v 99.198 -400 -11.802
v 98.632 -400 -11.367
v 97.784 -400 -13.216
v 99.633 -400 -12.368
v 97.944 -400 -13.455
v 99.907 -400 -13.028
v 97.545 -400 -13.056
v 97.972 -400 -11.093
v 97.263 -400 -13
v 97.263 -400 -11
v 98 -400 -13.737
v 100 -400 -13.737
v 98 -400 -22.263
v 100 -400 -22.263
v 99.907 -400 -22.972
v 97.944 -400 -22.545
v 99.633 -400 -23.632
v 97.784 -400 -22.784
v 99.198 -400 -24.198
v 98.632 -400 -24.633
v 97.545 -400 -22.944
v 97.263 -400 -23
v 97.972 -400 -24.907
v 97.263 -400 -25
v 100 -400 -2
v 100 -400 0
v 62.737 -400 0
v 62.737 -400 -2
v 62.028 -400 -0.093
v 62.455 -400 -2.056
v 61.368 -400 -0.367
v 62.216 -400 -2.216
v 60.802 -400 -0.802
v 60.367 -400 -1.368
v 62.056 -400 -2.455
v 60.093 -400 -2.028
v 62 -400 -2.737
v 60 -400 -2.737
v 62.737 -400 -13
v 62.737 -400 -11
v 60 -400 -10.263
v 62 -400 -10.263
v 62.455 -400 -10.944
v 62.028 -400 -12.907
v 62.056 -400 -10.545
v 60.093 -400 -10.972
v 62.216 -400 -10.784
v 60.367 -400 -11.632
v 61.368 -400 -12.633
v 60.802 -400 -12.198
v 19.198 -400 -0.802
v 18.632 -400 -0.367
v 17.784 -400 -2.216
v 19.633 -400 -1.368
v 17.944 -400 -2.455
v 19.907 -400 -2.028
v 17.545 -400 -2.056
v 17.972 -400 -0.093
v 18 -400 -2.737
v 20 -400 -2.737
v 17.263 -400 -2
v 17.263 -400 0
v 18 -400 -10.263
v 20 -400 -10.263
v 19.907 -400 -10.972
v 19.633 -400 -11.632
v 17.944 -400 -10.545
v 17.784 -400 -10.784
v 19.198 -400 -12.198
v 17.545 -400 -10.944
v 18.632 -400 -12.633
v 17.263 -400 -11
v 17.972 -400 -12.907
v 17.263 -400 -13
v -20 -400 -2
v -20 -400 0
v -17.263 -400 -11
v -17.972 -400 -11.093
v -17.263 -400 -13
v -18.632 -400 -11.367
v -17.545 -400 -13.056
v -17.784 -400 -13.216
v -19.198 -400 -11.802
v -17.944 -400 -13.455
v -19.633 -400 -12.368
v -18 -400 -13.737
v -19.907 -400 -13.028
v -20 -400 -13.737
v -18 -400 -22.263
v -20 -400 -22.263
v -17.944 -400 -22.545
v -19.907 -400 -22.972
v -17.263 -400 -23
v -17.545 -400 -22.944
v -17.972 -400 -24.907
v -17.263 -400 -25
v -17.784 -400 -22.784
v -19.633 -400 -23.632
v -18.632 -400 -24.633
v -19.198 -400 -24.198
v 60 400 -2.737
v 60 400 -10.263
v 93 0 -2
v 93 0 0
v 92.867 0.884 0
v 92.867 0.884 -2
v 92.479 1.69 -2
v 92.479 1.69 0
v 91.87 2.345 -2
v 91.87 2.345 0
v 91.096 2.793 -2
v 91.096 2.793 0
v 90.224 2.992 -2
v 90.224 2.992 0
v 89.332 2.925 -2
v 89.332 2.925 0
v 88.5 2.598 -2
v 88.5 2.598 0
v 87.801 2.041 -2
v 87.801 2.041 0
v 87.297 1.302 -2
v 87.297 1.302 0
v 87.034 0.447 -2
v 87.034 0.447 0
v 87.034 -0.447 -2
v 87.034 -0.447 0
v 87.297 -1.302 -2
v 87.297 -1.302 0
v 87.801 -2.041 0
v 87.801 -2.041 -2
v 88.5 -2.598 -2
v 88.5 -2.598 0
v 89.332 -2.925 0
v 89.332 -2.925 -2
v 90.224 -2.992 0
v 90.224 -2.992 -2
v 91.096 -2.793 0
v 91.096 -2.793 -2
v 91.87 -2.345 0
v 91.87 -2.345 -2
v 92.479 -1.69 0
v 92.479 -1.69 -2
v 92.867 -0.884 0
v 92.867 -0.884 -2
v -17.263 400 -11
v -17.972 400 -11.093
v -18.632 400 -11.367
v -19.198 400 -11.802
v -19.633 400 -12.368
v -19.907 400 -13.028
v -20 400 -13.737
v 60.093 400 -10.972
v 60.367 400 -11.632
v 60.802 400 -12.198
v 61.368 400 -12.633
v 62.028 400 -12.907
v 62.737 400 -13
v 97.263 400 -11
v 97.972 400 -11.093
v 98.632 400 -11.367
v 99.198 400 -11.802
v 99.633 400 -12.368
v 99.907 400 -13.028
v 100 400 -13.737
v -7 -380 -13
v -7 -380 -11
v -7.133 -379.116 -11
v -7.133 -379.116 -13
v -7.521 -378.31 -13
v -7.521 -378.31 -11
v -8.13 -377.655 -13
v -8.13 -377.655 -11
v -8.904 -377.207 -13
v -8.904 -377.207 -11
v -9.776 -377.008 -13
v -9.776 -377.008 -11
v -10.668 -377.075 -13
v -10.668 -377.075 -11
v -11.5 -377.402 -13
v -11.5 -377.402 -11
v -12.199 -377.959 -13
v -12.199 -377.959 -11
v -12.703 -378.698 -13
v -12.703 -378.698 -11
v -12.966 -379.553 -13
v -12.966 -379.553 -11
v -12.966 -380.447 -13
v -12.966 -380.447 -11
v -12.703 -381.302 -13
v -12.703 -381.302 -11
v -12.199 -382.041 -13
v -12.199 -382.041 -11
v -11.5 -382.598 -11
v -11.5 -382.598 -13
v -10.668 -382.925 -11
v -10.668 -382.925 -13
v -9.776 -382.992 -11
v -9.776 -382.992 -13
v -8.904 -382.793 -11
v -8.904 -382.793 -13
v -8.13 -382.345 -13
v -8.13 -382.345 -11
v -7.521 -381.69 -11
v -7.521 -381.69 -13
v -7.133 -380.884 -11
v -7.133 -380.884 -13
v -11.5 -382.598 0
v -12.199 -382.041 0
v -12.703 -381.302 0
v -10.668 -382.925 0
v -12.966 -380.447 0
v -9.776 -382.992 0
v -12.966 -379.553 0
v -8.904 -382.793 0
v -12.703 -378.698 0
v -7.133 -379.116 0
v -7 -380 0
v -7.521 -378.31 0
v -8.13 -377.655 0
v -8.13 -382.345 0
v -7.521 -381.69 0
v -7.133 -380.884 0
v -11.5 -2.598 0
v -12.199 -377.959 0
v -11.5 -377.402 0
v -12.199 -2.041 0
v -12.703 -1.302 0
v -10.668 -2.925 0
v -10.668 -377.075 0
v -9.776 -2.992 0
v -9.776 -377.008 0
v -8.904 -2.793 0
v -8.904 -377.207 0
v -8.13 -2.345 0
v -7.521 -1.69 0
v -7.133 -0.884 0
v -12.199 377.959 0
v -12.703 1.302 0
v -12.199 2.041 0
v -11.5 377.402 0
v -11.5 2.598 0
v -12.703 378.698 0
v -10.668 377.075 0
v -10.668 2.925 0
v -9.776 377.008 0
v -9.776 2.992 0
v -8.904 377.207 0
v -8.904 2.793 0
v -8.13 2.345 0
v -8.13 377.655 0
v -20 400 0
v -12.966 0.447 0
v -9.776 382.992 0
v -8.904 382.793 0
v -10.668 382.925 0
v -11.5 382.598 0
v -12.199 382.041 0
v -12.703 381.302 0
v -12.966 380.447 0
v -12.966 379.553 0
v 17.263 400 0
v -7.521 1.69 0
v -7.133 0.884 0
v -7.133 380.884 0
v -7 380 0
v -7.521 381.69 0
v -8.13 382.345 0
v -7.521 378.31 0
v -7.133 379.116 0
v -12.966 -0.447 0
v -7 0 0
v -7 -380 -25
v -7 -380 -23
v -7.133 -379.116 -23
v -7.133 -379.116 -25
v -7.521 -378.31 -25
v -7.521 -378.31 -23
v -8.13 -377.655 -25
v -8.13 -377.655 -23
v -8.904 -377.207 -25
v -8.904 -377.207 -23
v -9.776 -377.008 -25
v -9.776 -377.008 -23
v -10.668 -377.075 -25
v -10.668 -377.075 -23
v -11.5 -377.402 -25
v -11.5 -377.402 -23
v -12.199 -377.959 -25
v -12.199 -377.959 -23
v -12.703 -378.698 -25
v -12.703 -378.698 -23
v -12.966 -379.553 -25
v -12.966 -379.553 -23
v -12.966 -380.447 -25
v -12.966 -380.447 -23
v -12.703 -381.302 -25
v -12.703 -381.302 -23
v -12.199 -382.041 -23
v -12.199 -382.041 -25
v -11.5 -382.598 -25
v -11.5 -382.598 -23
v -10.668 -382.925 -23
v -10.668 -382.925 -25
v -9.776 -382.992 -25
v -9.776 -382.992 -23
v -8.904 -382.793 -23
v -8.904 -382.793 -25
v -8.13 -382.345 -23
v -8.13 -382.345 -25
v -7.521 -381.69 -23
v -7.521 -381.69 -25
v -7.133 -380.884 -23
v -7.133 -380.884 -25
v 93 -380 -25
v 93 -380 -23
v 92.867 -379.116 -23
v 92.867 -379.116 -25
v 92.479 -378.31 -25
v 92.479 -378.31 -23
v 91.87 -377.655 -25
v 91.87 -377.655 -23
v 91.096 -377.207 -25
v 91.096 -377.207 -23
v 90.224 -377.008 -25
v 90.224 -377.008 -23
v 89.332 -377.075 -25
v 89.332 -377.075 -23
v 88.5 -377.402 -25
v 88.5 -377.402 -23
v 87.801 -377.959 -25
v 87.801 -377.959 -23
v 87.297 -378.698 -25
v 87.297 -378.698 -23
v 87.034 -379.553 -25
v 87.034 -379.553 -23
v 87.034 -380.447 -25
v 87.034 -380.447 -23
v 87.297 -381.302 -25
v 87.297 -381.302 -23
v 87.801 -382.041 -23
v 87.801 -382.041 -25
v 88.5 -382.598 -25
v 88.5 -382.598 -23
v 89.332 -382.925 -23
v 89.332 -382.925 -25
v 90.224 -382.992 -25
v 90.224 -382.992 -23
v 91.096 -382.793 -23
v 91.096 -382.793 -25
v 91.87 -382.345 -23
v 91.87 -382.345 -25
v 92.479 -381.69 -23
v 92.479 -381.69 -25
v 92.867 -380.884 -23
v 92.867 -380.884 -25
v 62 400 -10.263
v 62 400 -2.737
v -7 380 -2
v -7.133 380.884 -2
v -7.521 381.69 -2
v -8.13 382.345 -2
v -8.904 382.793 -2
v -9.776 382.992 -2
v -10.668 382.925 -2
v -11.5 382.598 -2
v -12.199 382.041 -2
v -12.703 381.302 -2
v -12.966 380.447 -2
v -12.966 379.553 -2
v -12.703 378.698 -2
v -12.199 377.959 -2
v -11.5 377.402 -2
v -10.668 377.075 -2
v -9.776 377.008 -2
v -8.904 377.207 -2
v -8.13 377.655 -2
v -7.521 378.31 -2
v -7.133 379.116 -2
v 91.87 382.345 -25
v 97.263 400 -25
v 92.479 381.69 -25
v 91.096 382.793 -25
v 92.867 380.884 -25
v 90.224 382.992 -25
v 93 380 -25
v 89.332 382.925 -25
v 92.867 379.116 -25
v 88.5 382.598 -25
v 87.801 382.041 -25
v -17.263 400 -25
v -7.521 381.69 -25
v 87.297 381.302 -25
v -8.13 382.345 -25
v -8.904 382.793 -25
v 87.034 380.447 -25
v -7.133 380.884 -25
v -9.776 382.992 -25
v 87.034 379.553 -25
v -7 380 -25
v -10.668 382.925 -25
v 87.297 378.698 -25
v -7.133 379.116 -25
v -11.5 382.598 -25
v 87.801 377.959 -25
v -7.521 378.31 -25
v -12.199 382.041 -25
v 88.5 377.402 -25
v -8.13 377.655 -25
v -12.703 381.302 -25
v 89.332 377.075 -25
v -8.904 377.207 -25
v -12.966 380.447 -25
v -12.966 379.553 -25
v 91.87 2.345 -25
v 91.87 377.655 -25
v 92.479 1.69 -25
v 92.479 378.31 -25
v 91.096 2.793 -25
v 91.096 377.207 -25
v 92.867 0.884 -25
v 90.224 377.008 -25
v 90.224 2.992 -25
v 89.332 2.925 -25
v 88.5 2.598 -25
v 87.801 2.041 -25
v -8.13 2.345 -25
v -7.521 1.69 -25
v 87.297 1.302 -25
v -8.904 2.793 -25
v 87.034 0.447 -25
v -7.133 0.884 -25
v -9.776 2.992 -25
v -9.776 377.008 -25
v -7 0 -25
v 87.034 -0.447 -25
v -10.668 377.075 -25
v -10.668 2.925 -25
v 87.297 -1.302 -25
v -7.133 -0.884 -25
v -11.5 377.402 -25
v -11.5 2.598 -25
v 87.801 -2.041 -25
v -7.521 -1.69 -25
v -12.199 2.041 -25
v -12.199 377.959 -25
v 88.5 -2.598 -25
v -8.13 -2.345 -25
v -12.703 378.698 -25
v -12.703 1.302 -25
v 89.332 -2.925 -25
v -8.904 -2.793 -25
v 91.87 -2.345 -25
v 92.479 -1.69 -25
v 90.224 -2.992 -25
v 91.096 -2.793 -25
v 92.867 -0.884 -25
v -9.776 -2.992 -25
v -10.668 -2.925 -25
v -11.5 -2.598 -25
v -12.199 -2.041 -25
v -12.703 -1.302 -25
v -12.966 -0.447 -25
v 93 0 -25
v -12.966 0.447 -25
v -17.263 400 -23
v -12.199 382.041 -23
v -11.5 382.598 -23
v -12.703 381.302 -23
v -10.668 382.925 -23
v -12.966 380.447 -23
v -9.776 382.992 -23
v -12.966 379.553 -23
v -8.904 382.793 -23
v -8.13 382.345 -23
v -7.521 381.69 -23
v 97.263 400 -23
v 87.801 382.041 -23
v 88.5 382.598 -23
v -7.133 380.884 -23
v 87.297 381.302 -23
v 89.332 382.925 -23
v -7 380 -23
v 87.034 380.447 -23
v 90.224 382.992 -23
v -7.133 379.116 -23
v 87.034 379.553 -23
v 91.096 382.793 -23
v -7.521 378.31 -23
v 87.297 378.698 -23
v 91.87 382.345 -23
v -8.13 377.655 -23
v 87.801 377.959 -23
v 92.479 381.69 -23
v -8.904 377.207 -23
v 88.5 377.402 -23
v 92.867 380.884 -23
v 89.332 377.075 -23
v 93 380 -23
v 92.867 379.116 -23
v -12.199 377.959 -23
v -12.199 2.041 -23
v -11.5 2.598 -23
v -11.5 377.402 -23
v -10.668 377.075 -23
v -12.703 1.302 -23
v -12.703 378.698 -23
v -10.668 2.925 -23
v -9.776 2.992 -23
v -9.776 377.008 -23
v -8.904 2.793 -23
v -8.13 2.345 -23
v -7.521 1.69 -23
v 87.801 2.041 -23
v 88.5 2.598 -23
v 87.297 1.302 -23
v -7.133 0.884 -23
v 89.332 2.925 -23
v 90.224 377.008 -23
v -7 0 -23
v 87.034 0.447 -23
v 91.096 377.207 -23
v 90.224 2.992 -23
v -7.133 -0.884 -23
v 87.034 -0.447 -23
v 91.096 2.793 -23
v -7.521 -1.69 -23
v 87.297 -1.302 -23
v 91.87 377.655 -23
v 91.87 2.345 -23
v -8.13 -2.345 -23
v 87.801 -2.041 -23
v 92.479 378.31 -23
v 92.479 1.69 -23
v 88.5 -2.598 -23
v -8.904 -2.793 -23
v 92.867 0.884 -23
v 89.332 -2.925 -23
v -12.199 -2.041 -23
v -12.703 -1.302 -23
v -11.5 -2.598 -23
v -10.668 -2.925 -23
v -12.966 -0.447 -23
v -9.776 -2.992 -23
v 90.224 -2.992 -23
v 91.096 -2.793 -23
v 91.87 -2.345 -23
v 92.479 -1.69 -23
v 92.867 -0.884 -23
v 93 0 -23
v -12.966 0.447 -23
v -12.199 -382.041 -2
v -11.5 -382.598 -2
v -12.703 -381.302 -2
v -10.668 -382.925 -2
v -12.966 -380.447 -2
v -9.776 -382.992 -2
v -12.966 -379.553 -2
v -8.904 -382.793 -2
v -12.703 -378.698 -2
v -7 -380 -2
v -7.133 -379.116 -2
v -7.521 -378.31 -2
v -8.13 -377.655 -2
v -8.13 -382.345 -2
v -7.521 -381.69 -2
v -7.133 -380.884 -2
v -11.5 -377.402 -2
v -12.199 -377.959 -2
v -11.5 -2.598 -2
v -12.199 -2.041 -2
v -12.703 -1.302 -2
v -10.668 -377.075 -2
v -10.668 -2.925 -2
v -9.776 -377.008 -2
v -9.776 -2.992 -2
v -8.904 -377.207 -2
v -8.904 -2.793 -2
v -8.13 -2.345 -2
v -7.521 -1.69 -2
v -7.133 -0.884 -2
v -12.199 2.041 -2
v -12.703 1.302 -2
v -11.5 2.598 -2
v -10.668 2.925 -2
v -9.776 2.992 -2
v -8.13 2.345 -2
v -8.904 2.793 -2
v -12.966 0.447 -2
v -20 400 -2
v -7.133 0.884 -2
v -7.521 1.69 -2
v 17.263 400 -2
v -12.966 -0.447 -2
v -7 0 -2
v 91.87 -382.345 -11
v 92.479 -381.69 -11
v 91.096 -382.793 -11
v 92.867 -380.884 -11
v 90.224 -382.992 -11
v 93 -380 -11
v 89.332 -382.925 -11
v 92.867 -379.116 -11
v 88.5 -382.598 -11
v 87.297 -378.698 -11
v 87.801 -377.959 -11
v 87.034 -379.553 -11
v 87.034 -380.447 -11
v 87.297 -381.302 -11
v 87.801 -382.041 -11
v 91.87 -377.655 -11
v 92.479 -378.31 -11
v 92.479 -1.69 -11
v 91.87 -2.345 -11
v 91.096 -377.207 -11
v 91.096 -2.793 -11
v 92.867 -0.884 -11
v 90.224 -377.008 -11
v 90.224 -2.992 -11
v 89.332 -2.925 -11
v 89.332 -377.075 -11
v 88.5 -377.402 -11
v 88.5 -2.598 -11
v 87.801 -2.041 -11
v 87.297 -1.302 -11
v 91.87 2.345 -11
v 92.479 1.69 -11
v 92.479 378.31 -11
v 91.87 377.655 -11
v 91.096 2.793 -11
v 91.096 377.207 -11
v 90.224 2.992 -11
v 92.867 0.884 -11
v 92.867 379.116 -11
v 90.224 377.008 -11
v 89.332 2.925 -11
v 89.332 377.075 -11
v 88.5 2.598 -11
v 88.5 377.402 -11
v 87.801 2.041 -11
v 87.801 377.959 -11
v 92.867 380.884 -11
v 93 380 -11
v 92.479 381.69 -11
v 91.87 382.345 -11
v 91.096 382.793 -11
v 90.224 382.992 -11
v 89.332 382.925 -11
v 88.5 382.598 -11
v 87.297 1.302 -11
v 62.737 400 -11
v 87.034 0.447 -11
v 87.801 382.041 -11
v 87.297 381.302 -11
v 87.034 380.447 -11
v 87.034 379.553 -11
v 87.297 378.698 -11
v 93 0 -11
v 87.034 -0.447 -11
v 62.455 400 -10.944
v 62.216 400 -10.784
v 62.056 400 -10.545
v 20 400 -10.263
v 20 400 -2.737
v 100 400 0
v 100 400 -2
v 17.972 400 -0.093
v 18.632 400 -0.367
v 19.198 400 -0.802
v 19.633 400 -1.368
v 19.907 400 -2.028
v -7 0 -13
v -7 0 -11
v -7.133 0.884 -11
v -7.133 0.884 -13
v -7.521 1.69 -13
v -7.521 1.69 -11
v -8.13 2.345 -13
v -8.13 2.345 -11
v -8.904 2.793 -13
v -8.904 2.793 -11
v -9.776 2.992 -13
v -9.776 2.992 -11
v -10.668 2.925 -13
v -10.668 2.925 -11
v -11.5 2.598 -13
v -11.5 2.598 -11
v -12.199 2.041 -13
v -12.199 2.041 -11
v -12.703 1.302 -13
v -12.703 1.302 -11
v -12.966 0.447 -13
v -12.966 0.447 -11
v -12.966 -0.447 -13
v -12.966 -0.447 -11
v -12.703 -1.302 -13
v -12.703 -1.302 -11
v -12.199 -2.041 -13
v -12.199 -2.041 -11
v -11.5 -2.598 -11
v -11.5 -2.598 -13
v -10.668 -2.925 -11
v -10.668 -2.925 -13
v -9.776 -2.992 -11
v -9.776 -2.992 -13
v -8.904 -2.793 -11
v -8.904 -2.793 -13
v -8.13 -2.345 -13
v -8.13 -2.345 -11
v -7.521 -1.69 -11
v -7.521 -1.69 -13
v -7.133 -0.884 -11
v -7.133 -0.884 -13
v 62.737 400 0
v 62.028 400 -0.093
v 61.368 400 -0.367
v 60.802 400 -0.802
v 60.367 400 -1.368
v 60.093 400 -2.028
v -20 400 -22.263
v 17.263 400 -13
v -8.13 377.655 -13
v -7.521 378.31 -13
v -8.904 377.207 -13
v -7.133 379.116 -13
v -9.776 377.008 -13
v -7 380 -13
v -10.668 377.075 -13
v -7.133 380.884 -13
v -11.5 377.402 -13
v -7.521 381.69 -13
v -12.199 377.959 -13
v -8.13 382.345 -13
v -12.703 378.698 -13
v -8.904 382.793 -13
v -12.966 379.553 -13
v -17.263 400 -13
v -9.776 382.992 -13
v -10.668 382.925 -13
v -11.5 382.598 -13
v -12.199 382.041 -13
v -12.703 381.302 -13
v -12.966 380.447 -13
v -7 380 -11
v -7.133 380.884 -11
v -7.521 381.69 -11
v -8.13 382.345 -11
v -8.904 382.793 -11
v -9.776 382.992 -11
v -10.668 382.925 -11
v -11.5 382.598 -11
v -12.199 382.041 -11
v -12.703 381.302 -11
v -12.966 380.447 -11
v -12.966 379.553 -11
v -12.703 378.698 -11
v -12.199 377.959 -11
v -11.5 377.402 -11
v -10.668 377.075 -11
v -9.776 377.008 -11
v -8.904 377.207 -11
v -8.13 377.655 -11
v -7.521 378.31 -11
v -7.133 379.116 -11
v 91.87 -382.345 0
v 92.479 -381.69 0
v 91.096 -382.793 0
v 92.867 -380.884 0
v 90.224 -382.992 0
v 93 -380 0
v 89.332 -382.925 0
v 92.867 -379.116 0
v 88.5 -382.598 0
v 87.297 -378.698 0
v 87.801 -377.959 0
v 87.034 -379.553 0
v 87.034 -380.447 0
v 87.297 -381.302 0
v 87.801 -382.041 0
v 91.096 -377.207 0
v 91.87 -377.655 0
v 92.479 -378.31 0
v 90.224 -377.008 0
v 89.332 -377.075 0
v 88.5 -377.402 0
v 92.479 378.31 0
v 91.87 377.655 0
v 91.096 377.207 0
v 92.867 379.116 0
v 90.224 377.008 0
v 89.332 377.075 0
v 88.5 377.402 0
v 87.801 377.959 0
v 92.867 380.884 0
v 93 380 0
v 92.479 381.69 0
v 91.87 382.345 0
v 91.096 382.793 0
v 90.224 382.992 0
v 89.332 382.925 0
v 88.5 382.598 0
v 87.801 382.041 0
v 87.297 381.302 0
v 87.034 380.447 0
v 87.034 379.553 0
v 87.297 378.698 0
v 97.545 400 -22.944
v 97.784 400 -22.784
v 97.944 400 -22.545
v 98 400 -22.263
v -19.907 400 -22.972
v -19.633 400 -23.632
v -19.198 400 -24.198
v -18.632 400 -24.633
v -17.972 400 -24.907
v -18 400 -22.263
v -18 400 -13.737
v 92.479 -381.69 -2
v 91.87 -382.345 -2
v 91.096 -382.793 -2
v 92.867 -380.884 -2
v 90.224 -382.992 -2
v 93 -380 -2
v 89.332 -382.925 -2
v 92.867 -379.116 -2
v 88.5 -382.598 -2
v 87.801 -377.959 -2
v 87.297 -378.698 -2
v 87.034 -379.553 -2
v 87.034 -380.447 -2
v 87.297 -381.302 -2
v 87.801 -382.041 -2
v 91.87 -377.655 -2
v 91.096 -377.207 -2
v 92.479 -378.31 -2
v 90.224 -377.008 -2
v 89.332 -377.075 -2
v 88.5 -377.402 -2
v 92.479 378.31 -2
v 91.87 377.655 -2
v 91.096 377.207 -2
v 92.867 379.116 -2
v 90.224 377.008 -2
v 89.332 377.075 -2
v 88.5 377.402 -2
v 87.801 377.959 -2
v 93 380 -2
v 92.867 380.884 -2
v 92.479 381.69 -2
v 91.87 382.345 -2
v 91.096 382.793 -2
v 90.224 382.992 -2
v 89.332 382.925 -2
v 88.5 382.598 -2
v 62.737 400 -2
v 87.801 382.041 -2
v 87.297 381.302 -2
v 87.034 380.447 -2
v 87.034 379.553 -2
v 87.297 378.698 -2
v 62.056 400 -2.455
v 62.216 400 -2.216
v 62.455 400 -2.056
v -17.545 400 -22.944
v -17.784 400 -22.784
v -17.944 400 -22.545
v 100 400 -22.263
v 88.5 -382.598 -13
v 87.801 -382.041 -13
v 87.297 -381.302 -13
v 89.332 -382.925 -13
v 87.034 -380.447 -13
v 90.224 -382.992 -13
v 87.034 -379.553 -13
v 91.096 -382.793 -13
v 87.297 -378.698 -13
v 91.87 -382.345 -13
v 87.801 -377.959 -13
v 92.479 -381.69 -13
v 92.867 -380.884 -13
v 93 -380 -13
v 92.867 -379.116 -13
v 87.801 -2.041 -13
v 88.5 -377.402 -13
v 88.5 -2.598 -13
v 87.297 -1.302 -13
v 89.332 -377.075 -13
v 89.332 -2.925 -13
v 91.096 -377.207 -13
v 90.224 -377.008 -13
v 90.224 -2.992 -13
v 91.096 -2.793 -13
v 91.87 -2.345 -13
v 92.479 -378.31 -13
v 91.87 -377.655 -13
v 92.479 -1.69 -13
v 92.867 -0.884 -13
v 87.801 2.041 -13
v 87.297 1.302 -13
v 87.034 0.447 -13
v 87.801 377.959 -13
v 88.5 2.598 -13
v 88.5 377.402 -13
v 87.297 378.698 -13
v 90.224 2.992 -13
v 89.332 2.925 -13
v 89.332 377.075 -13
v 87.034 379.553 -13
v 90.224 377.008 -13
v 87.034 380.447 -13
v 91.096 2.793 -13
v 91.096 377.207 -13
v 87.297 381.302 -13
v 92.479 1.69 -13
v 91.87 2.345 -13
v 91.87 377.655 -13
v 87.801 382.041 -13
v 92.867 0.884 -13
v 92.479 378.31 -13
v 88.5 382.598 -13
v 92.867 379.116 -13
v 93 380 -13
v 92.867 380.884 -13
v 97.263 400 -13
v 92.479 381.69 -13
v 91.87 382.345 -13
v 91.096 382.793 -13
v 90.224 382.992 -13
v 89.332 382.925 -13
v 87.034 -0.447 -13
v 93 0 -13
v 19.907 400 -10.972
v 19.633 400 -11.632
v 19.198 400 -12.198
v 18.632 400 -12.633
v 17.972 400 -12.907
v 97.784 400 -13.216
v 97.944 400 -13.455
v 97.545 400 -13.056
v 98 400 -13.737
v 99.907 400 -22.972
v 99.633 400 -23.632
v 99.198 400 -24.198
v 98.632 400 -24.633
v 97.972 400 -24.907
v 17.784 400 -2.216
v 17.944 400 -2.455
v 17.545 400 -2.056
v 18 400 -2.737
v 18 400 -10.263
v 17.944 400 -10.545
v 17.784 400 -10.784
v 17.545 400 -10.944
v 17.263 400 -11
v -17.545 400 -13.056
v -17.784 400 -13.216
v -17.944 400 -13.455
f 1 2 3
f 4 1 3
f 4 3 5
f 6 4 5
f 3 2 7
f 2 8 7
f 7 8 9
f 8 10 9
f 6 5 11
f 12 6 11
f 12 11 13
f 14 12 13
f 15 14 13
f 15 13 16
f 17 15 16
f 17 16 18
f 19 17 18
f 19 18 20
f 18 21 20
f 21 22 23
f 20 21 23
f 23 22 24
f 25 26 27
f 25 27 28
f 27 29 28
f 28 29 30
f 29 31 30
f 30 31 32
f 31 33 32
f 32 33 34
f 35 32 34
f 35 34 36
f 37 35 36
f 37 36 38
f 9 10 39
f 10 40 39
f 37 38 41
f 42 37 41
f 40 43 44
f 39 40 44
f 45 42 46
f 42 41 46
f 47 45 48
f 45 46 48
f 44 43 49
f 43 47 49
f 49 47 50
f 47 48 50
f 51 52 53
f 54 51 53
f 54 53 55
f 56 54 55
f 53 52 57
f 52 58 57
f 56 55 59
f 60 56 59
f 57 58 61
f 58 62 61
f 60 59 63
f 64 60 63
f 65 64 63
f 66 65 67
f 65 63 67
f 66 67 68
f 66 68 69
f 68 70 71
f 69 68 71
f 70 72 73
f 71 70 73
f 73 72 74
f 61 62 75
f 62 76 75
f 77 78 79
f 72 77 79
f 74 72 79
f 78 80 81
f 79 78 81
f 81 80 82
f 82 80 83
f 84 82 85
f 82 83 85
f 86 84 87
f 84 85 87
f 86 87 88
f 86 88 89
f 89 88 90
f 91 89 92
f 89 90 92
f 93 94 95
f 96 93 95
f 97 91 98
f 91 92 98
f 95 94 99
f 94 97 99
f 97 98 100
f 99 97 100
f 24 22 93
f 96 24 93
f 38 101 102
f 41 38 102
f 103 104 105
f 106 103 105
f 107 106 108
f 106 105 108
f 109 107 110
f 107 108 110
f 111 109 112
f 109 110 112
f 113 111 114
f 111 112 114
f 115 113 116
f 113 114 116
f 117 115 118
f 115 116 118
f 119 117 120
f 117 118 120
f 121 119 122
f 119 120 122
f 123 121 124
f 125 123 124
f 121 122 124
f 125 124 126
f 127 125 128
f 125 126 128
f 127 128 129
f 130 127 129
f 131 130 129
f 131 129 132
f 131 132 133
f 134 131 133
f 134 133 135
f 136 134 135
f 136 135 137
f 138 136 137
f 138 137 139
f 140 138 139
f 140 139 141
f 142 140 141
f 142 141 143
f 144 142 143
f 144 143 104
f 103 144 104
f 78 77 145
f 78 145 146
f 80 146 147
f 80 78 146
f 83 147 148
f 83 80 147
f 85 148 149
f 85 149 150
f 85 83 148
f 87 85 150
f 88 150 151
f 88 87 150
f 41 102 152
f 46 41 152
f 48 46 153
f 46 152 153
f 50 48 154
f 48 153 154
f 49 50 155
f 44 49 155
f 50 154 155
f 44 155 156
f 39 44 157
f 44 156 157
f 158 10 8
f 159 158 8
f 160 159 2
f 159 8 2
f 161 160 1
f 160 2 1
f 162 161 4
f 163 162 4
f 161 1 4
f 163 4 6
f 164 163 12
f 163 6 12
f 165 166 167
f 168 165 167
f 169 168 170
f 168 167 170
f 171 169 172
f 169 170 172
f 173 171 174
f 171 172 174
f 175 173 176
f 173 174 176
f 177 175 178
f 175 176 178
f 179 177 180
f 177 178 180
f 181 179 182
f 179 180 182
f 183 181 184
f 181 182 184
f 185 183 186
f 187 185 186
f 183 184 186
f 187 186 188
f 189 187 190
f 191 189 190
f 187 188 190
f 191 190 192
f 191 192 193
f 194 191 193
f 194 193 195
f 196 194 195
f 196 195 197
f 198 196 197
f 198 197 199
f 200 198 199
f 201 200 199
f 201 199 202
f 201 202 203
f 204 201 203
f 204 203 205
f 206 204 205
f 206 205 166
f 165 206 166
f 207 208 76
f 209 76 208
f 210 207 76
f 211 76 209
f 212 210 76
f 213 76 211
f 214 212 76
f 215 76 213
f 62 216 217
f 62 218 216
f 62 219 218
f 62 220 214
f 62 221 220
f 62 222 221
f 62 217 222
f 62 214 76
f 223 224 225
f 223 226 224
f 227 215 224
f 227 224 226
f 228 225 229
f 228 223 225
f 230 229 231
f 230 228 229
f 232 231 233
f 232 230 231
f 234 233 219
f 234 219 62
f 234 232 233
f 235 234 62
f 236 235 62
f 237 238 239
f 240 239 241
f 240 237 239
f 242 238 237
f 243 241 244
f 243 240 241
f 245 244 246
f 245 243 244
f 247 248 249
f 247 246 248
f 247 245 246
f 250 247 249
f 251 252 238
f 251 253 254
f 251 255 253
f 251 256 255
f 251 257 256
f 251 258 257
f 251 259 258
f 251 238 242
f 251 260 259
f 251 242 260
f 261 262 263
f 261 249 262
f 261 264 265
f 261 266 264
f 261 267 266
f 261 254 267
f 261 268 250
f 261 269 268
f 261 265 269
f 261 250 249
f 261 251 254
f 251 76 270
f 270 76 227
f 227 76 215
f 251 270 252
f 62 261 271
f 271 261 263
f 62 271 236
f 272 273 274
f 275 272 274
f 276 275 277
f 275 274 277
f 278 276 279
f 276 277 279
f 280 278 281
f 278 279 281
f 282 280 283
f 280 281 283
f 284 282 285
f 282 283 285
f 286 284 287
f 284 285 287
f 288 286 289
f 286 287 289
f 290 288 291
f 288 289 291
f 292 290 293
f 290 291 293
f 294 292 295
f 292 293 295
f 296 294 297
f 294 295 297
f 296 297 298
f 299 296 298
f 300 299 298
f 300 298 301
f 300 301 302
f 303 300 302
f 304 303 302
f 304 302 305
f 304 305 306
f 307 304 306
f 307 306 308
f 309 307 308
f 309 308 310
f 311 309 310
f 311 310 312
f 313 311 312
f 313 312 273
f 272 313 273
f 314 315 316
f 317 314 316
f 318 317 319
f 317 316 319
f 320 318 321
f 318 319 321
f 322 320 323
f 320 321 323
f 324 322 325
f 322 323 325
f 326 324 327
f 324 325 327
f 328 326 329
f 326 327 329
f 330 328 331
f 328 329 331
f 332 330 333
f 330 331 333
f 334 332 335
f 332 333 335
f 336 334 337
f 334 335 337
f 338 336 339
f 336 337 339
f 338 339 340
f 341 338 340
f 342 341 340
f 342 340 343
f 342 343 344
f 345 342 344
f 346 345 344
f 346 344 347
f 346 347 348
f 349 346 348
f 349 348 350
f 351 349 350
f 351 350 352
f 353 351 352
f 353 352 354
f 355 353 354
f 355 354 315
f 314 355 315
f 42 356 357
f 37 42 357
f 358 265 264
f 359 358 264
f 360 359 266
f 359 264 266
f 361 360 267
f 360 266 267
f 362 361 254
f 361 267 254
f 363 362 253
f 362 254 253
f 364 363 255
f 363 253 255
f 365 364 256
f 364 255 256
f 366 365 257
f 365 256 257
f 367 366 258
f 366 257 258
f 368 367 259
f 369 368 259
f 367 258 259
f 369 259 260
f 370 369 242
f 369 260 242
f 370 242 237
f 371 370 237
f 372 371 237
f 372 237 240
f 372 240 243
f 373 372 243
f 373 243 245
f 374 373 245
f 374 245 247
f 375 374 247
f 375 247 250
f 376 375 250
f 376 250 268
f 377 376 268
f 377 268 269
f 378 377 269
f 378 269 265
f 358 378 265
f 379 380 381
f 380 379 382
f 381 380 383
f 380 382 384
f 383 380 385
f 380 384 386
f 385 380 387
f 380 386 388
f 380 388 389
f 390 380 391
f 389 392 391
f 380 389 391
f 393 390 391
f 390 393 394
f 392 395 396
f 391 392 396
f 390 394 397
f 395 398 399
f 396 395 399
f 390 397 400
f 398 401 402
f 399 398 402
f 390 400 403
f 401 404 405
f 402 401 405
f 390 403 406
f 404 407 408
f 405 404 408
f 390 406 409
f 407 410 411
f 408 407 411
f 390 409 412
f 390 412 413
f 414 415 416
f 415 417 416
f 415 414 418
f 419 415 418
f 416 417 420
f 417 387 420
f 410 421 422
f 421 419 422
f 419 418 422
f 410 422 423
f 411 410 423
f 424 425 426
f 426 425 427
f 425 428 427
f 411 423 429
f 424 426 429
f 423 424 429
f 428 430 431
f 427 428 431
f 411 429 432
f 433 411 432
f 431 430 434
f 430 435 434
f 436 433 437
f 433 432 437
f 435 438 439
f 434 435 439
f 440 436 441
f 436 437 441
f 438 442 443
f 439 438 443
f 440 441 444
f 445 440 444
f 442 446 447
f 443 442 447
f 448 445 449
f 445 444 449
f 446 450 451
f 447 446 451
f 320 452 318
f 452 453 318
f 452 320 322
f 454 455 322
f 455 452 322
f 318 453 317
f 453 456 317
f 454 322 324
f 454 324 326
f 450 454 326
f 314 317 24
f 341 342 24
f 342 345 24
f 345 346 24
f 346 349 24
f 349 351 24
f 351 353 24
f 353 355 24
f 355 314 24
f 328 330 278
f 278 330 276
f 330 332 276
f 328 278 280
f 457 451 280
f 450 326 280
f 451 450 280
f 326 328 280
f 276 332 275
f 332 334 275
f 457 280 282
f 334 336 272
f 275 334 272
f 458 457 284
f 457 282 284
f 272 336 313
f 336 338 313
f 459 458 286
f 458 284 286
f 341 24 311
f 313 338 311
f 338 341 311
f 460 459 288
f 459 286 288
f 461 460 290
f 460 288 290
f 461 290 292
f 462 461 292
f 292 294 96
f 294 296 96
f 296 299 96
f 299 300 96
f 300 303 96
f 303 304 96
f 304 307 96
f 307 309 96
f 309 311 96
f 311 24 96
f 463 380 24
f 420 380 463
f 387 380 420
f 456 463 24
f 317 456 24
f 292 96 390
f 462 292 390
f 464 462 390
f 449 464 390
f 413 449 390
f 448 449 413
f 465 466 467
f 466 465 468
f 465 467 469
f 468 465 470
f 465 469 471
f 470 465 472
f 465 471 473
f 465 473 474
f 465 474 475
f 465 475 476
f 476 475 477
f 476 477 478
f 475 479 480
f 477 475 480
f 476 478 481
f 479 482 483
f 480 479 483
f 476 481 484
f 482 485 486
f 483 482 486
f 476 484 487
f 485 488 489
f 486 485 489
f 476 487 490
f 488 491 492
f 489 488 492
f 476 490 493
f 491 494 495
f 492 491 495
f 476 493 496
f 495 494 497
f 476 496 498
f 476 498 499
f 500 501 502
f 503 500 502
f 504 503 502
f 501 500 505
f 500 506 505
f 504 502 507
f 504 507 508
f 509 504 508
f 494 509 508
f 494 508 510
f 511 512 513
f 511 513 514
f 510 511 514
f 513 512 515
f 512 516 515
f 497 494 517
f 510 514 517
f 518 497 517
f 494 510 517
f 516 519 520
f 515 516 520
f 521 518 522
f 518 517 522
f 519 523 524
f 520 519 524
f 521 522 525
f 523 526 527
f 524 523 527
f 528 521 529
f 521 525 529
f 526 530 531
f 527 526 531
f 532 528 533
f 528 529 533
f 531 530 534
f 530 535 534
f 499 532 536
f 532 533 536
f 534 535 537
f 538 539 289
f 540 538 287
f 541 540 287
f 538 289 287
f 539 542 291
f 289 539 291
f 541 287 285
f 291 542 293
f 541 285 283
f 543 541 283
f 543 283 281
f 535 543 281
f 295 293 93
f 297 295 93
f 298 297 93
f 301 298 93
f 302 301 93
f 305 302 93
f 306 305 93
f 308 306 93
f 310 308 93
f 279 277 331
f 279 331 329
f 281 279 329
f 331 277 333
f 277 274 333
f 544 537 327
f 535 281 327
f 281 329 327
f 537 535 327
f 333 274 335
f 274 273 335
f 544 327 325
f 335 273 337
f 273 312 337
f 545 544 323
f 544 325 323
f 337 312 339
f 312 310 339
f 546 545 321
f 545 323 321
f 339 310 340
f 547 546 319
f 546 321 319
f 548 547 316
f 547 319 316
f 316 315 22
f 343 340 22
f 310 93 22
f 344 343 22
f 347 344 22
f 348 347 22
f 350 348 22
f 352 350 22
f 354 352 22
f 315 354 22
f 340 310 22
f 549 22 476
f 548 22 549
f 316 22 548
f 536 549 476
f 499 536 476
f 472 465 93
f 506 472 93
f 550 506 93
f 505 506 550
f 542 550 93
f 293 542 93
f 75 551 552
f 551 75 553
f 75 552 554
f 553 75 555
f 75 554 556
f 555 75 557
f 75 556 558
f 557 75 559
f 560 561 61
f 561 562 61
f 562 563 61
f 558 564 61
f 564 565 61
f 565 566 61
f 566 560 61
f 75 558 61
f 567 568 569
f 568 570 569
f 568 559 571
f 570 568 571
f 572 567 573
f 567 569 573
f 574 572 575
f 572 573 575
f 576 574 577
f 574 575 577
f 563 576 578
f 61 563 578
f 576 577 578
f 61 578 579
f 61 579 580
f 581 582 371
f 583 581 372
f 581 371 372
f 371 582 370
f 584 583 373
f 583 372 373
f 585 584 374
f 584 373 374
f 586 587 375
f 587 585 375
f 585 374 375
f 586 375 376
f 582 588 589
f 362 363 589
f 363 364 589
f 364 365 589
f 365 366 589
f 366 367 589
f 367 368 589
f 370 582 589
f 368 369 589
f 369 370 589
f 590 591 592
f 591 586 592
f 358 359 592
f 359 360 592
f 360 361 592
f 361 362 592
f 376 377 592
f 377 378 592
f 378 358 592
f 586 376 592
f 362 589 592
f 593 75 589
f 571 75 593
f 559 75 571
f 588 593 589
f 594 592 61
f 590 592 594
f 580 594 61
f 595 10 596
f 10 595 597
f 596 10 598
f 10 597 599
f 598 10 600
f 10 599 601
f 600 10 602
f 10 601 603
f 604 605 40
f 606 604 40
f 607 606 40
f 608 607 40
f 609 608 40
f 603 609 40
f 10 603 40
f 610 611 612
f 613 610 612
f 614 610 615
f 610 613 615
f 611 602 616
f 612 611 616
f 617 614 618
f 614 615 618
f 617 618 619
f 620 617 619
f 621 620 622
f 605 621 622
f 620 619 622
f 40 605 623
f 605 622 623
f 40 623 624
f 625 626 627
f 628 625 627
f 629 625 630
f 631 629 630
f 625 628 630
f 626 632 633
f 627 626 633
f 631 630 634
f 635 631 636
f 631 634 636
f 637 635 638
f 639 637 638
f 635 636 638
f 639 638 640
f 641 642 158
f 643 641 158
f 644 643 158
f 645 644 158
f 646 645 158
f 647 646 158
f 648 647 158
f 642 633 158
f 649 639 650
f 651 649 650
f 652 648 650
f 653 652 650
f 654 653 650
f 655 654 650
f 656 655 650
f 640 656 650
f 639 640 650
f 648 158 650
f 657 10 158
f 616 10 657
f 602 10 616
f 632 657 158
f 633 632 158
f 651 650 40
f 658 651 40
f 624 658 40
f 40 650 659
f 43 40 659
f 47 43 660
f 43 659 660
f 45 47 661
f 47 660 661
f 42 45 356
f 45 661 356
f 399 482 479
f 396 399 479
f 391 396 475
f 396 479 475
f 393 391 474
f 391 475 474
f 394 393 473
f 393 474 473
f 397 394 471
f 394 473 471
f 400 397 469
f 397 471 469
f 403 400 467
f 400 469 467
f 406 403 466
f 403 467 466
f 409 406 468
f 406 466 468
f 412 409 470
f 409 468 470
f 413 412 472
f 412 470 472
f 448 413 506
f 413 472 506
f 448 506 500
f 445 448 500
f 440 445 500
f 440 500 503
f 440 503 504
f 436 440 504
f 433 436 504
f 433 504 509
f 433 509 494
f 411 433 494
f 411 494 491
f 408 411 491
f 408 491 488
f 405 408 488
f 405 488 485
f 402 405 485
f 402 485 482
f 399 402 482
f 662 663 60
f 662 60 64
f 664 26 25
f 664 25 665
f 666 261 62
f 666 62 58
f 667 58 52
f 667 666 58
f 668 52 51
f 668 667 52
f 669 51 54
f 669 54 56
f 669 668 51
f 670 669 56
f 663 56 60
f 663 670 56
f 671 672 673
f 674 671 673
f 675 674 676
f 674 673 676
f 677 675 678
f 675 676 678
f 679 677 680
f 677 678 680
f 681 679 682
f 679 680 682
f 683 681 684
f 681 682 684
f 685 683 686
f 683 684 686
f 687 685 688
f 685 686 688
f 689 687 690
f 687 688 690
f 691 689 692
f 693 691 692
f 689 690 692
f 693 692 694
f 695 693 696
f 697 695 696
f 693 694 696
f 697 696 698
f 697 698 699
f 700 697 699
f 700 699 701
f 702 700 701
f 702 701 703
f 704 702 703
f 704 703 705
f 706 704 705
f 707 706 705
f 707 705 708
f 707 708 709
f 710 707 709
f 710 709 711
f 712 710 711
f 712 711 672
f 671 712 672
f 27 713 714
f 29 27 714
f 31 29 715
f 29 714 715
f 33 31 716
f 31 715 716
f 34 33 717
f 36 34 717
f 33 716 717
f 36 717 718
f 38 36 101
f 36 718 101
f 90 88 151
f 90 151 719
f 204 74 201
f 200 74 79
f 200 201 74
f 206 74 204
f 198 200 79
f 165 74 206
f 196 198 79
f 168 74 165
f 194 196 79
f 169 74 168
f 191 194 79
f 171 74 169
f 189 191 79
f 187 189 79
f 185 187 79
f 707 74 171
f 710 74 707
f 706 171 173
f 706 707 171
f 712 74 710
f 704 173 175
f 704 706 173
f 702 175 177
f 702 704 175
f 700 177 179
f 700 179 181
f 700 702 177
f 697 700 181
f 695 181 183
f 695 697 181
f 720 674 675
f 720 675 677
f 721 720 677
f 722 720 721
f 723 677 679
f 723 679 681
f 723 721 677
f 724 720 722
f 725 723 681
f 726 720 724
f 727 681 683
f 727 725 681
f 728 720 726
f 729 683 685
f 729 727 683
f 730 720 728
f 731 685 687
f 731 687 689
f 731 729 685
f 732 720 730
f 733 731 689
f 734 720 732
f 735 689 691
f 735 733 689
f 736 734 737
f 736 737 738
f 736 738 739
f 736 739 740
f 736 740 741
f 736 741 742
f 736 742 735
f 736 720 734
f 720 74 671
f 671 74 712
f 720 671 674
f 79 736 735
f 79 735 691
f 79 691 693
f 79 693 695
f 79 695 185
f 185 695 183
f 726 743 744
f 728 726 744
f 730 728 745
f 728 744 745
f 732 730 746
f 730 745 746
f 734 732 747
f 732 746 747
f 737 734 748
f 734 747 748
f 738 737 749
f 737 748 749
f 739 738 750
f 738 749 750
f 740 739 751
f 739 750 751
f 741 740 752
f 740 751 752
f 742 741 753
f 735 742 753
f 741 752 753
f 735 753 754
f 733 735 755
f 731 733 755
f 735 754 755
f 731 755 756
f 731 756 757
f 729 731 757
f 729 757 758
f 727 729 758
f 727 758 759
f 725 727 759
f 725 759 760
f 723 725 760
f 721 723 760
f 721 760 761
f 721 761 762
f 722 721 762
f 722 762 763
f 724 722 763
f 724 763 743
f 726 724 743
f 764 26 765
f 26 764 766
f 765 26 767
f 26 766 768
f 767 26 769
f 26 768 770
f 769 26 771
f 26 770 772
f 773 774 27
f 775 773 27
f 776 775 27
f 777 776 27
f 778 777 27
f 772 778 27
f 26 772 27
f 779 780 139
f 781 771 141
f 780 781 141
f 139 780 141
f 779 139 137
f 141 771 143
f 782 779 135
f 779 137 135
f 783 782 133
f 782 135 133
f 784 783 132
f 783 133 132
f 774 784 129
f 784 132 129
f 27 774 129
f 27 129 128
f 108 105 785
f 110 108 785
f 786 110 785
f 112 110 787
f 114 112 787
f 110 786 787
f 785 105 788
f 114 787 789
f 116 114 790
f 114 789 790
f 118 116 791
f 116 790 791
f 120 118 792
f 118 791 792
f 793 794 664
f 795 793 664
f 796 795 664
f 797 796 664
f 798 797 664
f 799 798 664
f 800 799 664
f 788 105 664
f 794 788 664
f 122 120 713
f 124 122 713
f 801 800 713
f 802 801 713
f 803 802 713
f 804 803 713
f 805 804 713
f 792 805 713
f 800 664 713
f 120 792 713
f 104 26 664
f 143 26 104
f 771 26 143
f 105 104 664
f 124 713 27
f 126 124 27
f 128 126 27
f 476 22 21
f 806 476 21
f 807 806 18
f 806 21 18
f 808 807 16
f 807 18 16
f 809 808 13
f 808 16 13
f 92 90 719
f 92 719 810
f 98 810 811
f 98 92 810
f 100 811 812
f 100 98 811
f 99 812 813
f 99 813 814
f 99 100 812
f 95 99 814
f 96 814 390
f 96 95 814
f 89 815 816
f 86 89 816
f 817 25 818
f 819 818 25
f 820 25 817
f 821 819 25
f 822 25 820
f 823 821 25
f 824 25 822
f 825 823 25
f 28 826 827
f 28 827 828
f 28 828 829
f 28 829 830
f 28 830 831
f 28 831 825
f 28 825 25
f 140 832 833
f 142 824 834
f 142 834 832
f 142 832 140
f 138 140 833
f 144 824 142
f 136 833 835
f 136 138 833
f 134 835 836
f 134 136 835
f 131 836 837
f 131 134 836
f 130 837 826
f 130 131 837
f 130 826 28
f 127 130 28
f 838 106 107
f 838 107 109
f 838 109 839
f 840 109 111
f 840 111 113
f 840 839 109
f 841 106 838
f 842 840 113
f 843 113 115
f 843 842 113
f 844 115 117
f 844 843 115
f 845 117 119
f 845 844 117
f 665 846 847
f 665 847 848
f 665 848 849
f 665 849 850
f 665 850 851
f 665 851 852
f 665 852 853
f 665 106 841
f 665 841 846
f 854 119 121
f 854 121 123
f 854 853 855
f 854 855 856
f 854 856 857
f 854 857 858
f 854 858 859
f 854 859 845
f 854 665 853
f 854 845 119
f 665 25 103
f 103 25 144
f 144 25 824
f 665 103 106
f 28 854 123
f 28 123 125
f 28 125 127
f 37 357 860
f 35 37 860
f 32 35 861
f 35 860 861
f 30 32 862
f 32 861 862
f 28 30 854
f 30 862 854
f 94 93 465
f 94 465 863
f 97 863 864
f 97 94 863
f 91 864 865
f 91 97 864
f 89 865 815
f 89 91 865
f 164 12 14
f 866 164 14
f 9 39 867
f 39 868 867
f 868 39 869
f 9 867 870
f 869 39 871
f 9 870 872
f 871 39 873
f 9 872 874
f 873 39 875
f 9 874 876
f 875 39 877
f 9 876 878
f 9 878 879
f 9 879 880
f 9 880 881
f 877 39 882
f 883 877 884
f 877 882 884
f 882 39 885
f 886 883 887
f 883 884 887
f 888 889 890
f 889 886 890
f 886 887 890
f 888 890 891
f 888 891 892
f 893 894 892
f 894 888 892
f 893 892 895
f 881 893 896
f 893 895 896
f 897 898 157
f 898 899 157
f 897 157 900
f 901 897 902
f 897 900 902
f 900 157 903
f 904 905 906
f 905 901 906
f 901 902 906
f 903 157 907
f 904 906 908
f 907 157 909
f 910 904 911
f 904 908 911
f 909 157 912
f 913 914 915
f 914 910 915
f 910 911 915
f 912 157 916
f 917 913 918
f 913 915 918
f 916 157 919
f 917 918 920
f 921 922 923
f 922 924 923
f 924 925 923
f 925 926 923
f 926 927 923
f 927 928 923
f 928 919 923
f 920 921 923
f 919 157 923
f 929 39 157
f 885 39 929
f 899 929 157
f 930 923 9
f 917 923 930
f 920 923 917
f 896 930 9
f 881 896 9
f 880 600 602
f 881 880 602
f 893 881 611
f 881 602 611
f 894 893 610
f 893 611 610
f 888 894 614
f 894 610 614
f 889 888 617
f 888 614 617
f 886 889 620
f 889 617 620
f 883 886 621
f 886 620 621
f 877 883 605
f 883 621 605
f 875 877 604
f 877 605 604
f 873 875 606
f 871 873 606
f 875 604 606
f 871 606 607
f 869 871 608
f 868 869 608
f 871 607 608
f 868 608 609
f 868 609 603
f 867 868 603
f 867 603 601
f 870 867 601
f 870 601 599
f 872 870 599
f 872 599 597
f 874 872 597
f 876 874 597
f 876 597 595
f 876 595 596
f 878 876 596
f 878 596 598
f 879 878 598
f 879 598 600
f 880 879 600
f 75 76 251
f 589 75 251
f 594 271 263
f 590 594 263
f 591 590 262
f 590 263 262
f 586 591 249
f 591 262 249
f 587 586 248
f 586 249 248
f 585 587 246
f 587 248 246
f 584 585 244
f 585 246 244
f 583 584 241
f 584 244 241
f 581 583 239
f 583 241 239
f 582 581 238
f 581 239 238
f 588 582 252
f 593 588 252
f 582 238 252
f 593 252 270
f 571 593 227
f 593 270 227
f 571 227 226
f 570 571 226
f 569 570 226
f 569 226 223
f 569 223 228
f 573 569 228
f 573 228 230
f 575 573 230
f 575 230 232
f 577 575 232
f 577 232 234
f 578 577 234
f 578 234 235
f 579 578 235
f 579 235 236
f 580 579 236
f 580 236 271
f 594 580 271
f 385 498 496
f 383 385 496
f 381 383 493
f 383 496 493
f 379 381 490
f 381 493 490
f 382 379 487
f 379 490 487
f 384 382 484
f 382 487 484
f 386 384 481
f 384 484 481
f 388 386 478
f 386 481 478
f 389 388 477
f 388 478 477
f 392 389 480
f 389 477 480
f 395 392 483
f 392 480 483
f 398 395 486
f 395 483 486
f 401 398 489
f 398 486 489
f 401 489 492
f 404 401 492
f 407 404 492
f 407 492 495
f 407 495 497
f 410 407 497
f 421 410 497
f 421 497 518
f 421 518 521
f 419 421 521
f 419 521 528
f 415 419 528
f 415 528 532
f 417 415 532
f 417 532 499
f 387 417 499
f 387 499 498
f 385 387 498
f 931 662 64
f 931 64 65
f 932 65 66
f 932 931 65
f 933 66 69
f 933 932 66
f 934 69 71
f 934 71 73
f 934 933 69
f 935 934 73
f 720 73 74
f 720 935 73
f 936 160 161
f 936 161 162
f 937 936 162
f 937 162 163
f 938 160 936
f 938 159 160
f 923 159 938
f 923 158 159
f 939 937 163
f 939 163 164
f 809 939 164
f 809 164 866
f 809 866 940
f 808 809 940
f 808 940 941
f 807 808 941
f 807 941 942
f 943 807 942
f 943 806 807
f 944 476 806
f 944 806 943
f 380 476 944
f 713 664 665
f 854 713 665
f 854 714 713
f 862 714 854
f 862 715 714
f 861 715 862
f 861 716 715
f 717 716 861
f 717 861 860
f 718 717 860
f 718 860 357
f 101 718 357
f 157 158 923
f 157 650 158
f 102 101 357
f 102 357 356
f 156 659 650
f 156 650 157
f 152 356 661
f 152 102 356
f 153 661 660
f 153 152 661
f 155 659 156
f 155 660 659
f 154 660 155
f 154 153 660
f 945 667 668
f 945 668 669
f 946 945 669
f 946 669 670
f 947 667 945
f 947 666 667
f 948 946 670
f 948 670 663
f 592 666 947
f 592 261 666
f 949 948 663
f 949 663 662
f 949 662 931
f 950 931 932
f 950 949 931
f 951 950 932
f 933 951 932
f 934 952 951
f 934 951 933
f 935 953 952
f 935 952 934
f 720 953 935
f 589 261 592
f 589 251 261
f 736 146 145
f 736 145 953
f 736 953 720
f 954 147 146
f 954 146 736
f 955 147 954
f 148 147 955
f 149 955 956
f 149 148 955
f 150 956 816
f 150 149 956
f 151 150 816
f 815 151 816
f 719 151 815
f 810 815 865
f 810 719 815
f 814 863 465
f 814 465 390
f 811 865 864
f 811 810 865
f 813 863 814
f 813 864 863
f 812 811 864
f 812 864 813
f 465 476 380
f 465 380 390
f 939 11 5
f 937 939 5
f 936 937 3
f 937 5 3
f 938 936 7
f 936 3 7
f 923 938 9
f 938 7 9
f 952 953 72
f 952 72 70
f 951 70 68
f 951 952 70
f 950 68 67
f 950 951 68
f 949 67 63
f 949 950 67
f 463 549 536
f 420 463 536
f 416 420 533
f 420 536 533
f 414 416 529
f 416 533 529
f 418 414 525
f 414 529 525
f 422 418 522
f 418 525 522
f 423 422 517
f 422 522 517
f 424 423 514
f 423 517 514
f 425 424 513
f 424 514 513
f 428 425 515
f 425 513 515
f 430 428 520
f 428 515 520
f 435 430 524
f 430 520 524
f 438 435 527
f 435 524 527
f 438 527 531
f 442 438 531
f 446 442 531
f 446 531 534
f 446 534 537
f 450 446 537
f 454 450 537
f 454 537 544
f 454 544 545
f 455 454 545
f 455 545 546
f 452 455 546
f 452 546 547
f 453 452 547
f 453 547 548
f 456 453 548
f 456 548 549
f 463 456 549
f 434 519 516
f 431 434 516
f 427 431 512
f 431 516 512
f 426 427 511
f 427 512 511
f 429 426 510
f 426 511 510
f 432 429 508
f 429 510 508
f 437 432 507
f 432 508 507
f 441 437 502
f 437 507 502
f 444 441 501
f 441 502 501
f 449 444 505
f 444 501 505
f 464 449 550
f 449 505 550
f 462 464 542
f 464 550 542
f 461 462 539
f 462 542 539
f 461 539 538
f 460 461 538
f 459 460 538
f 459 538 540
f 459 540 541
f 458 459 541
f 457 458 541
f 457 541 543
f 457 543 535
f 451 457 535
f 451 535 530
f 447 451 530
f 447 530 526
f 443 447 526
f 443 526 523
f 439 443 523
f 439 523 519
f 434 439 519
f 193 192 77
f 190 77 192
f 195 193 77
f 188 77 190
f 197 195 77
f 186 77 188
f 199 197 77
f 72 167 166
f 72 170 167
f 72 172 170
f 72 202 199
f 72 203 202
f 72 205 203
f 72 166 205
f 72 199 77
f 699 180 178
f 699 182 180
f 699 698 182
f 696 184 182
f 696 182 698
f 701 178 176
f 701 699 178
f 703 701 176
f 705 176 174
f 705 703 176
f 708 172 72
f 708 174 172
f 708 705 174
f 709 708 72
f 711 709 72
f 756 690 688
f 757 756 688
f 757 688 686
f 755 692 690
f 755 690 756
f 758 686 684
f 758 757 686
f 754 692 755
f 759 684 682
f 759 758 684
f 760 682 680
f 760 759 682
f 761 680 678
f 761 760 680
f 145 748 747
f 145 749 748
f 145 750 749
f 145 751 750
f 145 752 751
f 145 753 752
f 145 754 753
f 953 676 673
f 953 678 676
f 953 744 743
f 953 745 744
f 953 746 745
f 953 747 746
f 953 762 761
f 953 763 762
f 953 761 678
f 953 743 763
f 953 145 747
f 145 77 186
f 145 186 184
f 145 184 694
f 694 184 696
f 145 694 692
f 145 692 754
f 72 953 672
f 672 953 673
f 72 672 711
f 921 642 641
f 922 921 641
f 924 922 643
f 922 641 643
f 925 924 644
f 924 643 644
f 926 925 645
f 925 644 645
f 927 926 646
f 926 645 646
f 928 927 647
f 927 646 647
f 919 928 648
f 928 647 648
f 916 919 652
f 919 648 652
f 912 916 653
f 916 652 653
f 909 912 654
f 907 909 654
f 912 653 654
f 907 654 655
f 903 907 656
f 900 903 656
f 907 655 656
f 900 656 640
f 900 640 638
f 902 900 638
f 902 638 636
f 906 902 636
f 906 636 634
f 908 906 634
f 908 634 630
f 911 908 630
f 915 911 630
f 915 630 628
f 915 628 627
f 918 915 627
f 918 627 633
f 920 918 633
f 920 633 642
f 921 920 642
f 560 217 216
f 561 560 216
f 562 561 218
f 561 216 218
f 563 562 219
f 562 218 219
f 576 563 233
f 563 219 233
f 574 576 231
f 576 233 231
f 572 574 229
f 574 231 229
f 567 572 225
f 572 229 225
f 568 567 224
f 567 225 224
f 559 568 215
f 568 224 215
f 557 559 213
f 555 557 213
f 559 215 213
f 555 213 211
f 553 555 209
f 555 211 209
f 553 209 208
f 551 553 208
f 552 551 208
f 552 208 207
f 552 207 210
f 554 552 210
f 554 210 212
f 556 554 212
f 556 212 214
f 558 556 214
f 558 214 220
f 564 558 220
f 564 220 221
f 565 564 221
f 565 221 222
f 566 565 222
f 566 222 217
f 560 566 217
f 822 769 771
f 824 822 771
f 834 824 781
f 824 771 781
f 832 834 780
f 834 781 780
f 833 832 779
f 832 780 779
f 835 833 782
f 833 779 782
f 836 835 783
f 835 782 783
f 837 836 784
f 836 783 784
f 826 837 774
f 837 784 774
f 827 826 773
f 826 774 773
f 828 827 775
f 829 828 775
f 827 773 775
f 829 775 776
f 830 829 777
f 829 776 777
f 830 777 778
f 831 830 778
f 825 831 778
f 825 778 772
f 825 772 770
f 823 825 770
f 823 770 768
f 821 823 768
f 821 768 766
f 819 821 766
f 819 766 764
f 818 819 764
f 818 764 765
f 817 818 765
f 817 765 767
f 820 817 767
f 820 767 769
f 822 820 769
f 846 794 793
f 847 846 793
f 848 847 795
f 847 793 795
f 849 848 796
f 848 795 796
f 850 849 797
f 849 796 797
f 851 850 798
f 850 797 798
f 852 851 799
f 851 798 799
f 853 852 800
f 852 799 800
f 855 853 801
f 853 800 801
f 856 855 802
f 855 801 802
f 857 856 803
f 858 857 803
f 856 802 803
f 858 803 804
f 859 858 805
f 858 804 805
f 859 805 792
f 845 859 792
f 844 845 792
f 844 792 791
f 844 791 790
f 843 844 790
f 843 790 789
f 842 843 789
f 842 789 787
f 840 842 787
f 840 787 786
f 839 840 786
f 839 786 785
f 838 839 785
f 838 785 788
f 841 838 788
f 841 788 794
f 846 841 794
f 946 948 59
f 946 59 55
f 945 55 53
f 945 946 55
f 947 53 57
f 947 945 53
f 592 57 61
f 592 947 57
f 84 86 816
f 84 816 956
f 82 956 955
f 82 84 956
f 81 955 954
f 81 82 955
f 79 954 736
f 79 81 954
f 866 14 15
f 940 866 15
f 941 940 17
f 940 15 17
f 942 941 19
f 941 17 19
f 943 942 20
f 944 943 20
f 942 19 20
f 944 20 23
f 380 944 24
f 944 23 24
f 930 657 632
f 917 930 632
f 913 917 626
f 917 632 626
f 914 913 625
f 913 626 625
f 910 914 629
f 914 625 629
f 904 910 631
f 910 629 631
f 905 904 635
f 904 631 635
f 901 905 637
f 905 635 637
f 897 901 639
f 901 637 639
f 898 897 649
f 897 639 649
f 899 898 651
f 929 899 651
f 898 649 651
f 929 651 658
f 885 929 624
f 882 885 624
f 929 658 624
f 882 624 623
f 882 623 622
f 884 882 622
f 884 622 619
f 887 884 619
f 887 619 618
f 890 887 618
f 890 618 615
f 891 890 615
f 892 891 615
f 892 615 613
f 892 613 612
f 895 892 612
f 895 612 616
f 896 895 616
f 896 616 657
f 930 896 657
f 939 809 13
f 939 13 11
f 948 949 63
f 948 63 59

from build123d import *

# Parameters (mm, degrees)
SKETCH1_W                    = 40
SKETCH1_H                    = 800
BASE_FLANGE1_DEPTH           = 2
EDGE_FLANGE1_STRIP_W         = 9.4732
EDGE_FLANGE1_STRIP_H         = 2
EDGE_FLANGE1_STRIP_CUT_DEPTH = 800
EDGE_FLANGE1_DEPTH           = 800
EDGE_FLANGE2_STRIP_W         = 9.4732
EDGE_FLANGE2_STRIP_H         = 2
EDGE_FLANGE2_STRIP_CUT_DEPTH = 800
EDGE_FLANGE2_DEPTH           = 800
EDGE_FLANGE3_STRIP_W         = 9.4732
EDGE_FLANGE3_STRIP_H         = 2
EDGE_FLANGE3_STRIP_CUT_DEPTH = 800
EDGE_FLANGE3_DEPTH           = 800
EDGE_FLANGE4_STRIP_W         = 9.4732
EDGE_FLANGE4_STRIP_H         = 2
EDGE_FLANGE4_STRIP_CUT_DEPTH = 800
EDGE_FLANGE4_DEPTH           = 800
SKETCH20_R                   = 3
CUT_EXTRUDE1_DEPTH           = 414.067791046


# Sheet-metal steps are written as plain solids
with BuildPart() as part:
    # Sketch1 → Base-Flange1 (new body)
    with BuildSketch(Plane.XY):
        Rectangle(SKETCH1_W, SKETCH1_H)
    extrude(amount=-BASE_FLANGE1_DEPTH)

    # Edge-Flange1 strip (across the edge) → Edge-Flange1 strip cut (cut)
    with BuildSketch(Plane(origin=(20, 400, -2), x_dir=(-1, 0, 0), z_dir=(0, -1, 0))):
        with Locations((-2, -1)):
            Rectangle(EDGE_FLANGE1_STRIP_W, EDGE_FLANGE1_STRIP_H)
    extrude(amount=EDGE_FLANGE1_STRIP_CUT_DEPTH, mode=Mode.SUBTRACT)

    # Edge-Flange1 section (across the edge) → Edge-Flange1 (add)
    with BuildSketch(Plane(origin=(20, 400, -2), x_dir=(-1, 0, 0), z_dir=(0, -1, 0))):
        with BuildLine():
            Line((0, 0.7366), (0, 11))
            Line((0, 11), (2, 11))
            Line((2, 11), (2, 0.7366))
            ThreePointArc((2, 0.7366), (2.215745145, 0.215745145), (2.7366, 0))
            Line((2.7366, 0), (2.7366, -2))
            ThreePointArc((2.7366, -2), (0.801531583, -1.198468417), (0, 0.7366))
        make_face()
    extrude(amount=EDGE_FLANGE1_DEPTH)

    # Edge-Flange2 strip (across the edge) → Edge-Flange2 strip cut (cut)
    with BuildSketch(Plane(origin=(18, 400, -13), x_dir=(0, 0, 1), z_dir=(0, -1, 0))):
        with Locations((-2, -1)):
            Rectangle(EDGE_FLANGE2_STRIP_W, EDGE_FLANGE2_STRIP_H)
    extrude(amount=EDGE_FLANGE2_STRIP_CUT_DEPTH, mode=Mode.SUBTRACT)

    # Edge-Flange2 section (across the edge) → Edge-Flange2 (add)
    with BuildSketch(Plane(origin=(18, 400, -13), x_dir=(0, 0, 1), z_dir=(0, -1, 0))):
        with BuildLine():
            Line((0, 0.7366), (0, 38))
            Line((0, 38), (2, 38))
            Line((2, 38), (2, 0.7366))
            ThreePointArc((2, 0.7366), (2.215745145, 0.215745145), (2.7366, 0))
            Line((2.7366, 0), (2.7366, -2))
            ThreePointArc((2.7366, -2), (0.801531583, -1.198468417), (0, 0.7366))
        make_face()
    extrude(amount=EDGE_FLANGE2_DEPTH)

    # Edge-Flange3 strip (across the edge) → Edge-Flange3 strip cut (cut)
    with BuildSketch(Plane(origin=(-20, -400, -13), x_dir=(1, 0, 0), z_dir=(0, 1, 0))):
        with Locations((-2, -1)):
            Rectangle(EDGE_FLANGE3_STRIP_W, EDGE_FLANGE3_STRIP_H)
    extrude(amount=EDGE_FLANGE3_STRIP_CUT_DEPTH, mode=Mode.SUBTRACT)

    # Edge-Flange3 section (across the edge) → Edge-Flange3 (add)
    with BuildSketch(Plane(origin=(-20, -400, -13), x_dir=(1, 0, 0), z_dir=(0, 1, 0))):
        with BuildLine():
            Line((0, 0.7366), (0, 12))
            Line((0, 12), (2, 12))
            Line((2, 12), (2, 0.7366))
            ThreePointArc((2, 0.7366), (2.215745145, 0.215745145), (2.7366, 0))
            Line((2.7366, 0), (2.7366, -2))
            ThreePointArc((2.7366, -2), (0.801531583, -1.198468417), (0, 0.7366))
        make_face()
    extrude(amount=EDGE_FLANGE3_DEPTH)

    # Edge-Flange4 strip (across the edge) → Edge-Flange4 strip cut (cut)
    with BuildSketch(Plane(origin=(-18, -400, -25), x_dir=(0, 0, 1), z_dir=(0, 1, 0))):
        with Locations((-2, -1)):
            Rectangle(EDGE_FLANGE4_STRIP_W, EDGE_FLANGE4_STRIP_H)
    extrude(amount=EDGE_FLANGE4_STRIP_CUT_DEPTH, mode=Mode.SUBTRACT)

    # Edge-Flange4 section (across the edge) → Edge-Flange4 (add)
    with BuildSketch(Plane(origin=(-18, -400, -25), x_dir=(0, 0, 1), z_dir=(0, 1, 0))):
        with BuildLine():
            Line((0, 0.7366), (0, 58))
            Line((0, 58), (2, 58))
            Line((2, 58), (2, 0.7366))
            ThreePointArc((2, 0.7366), (2.215745145, 0.215745145), (2.7366, 0))
            Line((2.7366, 0), (2.7366, -2))
            ThreePointArc((2.7366, -2), (0.801531583, -1.198468417), (0, 0.7366))
        make_face()
    extrude(amount=EDGE_FLANGE4_DEPTH)

    # Mirror2: part across plane


with BuildPart() as part_1:
    add(part.part)
    add(part.part.mirror(Plane(origin=(40, -400, -25), x_dir=(0, 0, 1), z_dir=(-1, 0, 0))))

    # Sketch20 → Cut-Extrude1 (cut, through all)
    with BuildSketch(Plane.XY):
        with Locations((90, 0)):
            Circle(SKETCH20_R)
        with Locations((90, 380)):
            Circle(SKETCH20_R)
        with Locations((90, -380)):
            Circle(SKETCH20_R)
        with Locations((-10, -380)):
            Circle(SKETCH20_R)
        with Locations((-10, 0)):
            Circle(SKETCH20_R)
        with Locations((-10, 380)):
            Circle(SKETCH20_R)
    extrude(amount=-CUT_EXTRUDE1_DEPTH, mode=Mode.SUBTRACT)


solid = part_1.part
